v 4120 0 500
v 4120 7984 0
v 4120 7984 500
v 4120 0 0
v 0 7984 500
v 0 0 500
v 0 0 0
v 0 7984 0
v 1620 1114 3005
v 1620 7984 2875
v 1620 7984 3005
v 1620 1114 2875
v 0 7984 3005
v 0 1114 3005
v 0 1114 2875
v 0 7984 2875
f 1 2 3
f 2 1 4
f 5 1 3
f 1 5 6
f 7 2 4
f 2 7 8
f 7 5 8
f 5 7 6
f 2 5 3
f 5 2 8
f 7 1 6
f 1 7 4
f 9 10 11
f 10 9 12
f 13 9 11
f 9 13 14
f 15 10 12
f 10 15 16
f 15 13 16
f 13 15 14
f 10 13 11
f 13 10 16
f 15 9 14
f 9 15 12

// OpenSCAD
terasz_sz = 7984;
terasz_melyseg = 4120;
terasz_magassag = 500;

erkelylemez_sz = 6870;
erkelylemez_melyseg = 4120-2500;
erkelylemez_vastagsag = 130;

zartszelveny_sz = 80;
zartszelveny_m = 80;

lab_sz = 150;
lab_m = 150;

tetogerenda_sz = lab_sz;
n_tetogerenda = 6;
tetogerenda_tavolsag = terasz_sz / n_tetogerenda;

module teraszalja(sz, mely, mag){
    cube([mely, sz ,mag]);
}

module erkelylemez(sz, mely, mag){
    cube([mely, sz, mag]);
}

module pergola_lab(){
    cube([150,150,2875]);
}

module pergola_falnal(){
}

module pergola_athidalo(){
}

module tetogerenda(sz, mag, hossz){
    cube([sz, mag, hossz]);
}

teraszalja(terasz_sz, terasz_melyseg, terasz_magassag);
translate([0,7984-6870,2875]) erkelylemez(erkelylemez_sz,
                                          erkelylemez_melyseg,
                                          erkelylemez_vastagsag);
